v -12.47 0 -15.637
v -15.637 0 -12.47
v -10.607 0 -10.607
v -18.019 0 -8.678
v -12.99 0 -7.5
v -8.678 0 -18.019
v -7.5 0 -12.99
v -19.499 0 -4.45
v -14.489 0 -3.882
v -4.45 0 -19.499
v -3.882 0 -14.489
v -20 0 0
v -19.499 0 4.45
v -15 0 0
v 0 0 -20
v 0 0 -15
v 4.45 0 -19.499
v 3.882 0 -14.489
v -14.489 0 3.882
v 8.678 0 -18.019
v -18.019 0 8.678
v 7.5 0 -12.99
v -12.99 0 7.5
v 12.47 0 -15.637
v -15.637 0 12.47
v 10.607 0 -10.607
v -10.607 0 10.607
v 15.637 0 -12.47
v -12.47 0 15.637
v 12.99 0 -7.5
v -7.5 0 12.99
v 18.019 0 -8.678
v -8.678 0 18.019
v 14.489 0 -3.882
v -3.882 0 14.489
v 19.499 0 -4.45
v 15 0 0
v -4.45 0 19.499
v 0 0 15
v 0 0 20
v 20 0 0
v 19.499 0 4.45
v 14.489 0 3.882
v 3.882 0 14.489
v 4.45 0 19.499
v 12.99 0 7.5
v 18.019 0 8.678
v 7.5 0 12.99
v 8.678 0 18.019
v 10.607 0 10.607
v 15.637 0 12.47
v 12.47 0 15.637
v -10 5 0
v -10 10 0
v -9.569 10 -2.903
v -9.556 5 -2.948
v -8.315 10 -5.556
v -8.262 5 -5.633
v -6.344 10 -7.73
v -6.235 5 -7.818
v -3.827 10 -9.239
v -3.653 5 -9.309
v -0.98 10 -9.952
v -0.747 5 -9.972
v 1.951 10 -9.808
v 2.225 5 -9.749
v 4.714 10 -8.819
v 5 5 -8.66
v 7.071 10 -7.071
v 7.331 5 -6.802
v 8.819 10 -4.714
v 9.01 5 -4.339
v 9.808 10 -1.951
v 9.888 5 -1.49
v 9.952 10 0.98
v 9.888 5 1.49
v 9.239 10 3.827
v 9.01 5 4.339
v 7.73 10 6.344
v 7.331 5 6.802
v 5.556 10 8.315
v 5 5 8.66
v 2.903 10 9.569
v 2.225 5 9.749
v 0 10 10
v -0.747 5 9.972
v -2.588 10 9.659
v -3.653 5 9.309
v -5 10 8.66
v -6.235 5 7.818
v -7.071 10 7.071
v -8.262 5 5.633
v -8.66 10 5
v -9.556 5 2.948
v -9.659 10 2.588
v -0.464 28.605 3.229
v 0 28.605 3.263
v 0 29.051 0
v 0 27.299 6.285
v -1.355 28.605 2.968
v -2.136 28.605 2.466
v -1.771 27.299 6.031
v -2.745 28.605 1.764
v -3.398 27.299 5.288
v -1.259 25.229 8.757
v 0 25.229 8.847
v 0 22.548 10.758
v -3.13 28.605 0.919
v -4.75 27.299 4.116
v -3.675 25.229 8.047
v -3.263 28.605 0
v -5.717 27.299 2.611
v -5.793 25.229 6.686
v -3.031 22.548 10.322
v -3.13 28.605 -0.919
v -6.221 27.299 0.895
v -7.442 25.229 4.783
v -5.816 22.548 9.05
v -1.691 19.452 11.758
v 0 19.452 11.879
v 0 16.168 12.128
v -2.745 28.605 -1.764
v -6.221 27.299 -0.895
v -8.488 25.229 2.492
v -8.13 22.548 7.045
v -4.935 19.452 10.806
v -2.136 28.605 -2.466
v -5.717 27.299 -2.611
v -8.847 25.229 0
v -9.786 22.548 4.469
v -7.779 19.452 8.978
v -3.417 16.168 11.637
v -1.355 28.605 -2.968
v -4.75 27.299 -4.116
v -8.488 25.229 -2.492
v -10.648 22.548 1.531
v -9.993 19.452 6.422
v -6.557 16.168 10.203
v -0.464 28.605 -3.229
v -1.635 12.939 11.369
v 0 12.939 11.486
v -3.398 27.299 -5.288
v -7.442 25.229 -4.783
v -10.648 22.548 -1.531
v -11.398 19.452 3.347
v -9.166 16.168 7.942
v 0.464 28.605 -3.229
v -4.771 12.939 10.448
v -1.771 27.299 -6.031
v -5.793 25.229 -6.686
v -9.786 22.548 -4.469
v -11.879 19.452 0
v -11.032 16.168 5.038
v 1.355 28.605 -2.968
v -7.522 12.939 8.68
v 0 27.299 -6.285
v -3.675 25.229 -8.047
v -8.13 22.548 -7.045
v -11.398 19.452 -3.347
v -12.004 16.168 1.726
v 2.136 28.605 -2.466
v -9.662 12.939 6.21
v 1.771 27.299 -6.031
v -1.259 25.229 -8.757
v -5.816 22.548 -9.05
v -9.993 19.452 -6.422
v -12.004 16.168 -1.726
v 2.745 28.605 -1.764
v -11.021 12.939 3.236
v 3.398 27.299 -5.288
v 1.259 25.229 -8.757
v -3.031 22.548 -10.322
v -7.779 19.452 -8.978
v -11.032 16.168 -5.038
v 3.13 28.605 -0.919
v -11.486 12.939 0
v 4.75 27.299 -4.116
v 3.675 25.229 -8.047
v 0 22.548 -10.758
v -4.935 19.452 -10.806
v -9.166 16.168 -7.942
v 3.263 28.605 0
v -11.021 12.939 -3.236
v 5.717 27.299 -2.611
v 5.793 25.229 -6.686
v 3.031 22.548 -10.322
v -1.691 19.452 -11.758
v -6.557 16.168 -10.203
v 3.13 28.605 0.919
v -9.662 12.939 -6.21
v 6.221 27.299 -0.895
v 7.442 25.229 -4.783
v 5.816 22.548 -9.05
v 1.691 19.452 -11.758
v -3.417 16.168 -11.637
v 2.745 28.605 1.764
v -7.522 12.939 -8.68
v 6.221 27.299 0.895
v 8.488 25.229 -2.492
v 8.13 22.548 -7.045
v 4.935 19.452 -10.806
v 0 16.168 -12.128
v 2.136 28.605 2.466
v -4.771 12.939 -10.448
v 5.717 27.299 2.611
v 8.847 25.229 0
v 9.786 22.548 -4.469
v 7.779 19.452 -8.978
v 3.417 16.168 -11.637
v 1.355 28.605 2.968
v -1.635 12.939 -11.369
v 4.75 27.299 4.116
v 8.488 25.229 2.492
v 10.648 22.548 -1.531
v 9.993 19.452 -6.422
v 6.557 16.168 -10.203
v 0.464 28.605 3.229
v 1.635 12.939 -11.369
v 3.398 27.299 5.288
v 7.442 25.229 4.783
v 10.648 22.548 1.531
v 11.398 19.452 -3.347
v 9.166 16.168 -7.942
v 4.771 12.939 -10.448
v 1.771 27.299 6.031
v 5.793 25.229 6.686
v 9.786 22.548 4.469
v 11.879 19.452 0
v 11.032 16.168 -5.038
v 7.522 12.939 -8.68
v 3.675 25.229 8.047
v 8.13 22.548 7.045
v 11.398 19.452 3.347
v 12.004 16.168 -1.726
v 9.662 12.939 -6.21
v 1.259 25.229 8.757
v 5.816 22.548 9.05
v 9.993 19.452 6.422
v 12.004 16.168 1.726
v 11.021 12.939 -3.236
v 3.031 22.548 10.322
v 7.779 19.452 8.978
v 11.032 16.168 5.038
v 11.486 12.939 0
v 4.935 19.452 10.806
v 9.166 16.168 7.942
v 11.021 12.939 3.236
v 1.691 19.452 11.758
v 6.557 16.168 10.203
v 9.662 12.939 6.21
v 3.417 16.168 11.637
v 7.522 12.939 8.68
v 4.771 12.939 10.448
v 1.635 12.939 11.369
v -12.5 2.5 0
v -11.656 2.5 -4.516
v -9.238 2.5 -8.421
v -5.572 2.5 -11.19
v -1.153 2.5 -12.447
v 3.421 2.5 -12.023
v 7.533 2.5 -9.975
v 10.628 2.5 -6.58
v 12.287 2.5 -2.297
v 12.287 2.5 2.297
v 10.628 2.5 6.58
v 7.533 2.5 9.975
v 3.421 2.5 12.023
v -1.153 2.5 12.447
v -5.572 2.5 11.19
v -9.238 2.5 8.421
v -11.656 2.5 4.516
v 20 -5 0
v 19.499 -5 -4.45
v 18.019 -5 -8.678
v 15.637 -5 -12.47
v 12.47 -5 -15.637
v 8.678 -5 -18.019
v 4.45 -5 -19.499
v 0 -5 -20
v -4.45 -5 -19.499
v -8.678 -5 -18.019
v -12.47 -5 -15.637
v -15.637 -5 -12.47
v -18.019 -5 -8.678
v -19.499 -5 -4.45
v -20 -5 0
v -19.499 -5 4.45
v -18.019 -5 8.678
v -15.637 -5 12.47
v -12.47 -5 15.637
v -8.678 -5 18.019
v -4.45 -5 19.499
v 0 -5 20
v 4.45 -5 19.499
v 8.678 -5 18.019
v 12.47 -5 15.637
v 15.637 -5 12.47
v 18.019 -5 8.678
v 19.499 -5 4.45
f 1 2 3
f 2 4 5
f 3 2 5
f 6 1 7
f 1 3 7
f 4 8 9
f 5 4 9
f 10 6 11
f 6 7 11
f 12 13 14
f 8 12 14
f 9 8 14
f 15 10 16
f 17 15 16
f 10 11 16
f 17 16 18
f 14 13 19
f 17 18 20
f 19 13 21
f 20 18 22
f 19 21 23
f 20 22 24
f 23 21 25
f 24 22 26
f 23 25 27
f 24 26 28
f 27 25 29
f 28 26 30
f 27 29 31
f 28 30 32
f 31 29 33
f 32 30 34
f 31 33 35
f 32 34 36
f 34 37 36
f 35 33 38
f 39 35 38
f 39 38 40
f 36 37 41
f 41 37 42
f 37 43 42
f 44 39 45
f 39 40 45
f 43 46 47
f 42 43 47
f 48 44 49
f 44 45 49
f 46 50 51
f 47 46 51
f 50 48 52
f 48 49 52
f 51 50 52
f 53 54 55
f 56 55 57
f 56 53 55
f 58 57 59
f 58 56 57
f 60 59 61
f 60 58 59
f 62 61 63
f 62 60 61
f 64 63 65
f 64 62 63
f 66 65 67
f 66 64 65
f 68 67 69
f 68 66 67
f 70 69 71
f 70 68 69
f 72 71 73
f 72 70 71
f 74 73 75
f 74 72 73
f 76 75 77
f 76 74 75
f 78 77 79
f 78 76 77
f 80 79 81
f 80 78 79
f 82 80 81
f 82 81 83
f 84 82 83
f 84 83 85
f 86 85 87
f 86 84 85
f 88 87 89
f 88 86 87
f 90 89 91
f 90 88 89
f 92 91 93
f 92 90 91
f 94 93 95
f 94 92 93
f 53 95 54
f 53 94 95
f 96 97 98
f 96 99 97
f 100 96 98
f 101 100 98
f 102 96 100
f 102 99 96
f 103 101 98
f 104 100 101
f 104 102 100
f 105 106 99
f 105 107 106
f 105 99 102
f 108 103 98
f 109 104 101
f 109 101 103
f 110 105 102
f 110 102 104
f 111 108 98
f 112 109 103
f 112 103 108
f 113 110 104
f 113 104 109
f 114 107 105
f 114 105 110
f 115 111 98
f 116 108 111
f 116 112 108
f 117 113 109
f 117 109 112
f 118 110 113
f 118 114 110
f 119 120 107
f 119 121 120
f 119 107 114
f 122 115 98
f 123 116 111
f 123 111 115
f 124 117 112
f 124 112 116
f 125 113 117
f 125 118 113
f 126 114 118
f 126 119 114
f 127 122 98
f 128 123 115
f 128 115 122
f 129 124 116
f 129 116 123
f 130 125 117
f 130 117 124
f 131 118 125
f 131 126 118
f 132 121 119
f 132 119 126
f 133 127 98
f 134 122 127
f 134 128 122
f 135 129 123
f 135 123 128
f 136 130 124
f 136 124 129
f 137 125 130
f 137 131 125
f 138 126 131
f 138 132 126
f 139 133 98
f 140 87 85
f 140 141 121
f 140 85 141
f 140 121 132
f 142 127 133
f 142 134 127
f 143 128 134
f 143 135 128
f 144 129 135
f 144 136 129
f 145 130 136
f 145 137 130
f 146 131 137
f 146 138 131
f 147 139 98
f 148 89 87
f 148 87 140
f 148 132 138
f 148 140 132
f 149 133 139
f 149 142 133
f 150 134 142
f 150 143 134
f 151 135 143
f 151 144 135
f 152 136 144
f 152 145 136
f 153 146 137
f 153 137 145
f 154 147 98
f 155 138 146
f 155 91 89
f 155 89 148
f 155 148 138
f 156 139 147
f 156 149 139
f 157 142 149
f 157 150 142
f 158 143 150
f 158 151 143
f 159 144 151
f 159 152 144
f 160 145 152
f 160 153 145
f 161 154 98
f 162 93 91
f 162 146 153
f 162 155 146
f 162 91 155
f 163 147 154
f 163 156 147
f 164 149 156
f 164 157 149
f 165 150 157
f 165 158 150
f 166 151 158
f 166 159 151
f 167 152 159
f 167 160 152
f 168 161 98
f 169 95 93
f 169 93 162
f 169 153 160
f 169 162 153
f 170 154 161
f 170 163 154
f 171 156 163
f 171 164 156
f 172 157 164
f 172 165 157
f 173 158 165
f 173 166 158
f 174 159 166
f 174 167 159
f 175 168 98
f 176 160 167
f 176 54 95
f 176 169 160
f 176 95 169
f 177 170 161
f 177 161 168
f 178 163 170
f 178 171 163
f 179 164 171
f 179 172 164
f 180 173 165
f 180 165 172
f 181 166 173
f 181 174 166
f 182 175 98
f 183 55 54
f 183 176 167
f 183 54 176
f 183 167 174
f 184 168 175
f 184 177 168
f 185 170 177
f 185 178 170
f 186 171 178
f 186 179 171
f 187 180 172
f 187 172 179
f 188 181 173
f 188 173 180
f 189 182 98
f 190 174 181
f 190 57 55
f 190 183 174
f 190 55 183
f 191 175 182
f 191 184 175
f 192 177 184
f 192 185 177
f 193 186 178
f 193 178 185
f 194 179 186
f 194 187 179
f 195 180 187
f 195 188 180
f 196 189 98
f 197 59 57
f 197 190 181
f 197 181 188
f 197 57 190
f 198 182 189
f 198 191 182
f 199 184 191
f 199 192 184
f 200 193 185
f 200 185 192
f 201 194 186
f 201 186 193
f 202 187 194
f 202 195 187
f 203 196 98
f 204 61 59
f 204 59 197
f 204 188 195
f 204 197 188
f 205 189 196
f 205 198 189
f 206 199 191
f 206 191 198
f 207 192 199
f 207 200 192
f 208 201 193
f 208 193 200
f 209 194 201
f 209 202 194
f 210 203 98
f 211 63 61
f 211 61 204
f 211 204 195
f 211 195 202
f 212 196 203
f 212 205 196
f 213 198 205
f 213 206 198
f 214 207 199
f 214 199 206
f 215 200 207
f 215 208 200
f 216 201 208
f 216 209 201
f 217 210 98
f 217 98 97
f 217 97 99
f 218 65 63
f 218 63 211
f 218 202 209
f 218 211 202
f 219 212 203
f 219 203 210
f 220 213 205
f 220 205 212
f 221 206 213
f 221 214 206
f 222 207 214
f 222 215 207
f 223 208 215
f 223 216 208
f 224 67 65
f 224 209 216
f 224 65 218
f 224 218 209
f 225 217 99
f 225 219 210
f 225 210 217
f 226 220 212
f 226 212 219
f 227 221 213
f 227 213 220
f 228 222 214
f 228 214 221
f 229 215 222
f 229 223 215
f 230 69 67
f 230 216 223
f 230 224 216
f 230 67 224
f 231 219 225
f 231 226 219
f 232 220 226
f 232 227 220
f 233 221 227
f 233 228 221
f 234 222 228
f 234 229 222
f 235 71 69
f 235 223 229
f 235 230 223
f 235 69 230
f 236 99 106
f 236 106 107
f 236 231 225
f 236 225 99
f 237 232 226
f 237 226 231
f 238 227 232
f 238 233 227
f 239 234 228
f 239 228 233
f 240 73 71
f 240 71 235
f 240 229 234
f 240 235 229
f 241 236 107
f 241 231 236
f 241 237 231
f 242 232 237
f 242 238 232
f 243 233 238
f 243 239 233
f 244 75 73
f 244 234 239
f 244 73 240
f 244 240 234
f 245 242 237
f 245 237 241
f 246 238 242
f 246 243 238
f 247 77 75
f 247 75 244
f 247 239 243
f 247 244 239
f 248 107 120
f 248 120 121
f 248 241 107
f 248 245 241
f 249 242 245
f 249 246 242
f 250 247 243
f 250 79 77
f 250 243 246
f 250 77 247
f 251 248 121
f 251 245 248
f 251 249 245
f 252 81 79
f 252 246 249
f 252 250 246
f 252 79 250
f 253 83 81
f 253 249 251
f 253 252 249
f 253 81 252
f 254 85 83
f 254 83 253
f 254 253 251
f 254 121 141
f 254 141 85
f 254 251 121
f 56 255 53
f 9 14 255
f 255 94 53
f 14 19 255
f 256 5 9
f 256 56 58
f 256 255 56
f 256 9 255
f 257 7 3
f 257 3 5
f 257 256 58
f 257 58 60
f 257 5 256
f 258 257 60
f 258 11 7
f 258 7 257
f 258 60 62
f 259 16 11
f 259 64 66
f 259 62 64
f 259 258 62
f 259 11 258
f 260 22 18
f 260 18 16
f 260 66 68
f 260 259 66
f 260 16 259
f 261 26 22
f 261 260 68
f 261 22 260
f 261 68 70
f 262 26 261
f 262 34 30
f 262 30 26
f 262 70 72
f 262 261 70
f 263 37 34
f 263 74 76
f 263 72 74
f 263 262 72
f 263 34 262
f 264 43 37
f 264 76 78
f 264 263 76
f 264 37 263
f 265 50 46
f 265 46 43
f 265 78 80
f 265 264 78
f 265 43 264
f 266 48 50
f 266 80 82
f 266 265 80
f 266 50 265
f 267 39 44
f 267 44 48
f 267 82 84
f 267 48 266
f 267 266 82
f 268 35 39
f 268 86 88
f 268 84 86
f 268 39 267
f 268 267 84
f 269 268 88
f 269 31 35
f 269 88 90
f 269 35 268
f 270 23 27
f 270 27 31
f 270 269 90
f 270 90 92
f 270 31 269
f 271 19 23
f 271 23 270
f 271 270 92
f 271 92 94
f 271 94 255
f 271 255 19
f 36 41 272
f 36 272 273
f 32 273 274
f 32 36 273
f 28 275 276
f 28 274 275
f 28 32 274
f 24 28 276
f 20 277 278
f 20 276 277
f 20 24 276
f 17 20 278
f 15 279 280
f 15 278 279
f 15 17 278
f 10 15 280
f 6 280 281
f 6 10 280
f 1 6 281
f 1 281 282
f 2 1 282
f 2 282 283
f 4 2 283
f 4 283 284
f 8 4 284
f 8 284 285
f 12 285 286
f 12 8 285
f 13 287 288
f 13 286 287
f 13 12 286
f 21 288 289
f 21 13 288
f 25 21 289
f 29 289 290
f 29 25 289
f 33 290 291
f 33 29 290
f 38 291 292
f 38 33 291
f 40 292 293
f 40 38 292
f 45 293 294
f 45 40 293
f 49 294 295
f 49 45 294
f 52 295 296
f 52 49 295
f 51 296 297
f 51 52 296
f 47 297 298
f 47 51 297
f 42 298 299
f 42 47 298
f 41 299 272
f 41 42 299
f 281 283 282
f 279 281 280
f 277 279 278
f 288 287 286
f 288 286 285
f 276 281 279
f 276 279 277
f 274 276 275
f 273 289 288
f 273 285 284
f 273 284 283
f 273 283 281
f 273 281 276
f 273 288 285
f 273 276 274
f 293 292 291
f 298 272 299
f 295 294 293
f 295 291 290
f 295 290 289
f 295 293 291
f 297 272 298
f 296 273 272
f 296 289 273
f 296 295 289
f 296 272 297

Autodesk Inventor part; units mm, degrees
ref_plane "YZ Plane" through (0, 0, 0) normal (1, 0, 0) x (0, 1, 0)
ref_plane "XZ Plane" through (0, 0, 0) normal (0, 1, 0) x (-1, 0, 0)
ref_plane "XY Plane" through (0, 0, 0) normal (0, 0, 1) x (1, 0, 0)
sketch "Sketch1" plane through (0, 0, 0) normal (0, 1, 0) x (-1, 0, 0)
  circle A0 centre (0, 0) radius 10
  dimension "d0" = 20
extrude "Extrusion1" add sketch "Sketch1" along normal blind 10
sketch "Sketch2" plane through (0, 0, 0) normal (1, 0, 0) x (0, 1, 0)
  line L0 (10, -10) -> (10, 10) projected
  line L1 (10, 0) -> (10, 12)
  line L2 (10, 0) -> (10, -12)
  circle A0 centre (10, -10) radius 12.15
  circle A1 centre (10, 10) radius 12.15
  circle A2 centre (16.9009, 0) radius 12.15
  line L3 (30.6793, 0) -> (0, 0)
  point P0 (29.0509, 0)
  point P1 (4.7509, 0)
  dimension "d5" = 24.3
  dimension "d6" = 24.3
  dimension "d3" = 12
  dimension "d4" = 12
  dimension "d7" = 24.3
revolve "Revolution1" add sketch "Sketch2" angle 360 about axis through (0, 30.6793, 0) along (0, -1, 0) picked at (16.7279, 5.8245) picked at (22.9675, 2.0985) contours L3 A2 A0 L0 | L0 A0 L3 | A0 L0 A2 A1 | A1 A2 L3 | A0 A2 L0
sketch "Sketch3" plane through (0, 0, 0) normal (0, -1, 0) x (1, 0, 0)
  circle A0 centre (0, 0) radius 20
  dimension "d9" = 40
extrude "Extrusion2" add sketch "Sketch3" along normal blind 5
chamfer "Chamfer1" distance 5 angle 45 1 edges at (10, 0, 0)
properties part number "Foot Swivel"
